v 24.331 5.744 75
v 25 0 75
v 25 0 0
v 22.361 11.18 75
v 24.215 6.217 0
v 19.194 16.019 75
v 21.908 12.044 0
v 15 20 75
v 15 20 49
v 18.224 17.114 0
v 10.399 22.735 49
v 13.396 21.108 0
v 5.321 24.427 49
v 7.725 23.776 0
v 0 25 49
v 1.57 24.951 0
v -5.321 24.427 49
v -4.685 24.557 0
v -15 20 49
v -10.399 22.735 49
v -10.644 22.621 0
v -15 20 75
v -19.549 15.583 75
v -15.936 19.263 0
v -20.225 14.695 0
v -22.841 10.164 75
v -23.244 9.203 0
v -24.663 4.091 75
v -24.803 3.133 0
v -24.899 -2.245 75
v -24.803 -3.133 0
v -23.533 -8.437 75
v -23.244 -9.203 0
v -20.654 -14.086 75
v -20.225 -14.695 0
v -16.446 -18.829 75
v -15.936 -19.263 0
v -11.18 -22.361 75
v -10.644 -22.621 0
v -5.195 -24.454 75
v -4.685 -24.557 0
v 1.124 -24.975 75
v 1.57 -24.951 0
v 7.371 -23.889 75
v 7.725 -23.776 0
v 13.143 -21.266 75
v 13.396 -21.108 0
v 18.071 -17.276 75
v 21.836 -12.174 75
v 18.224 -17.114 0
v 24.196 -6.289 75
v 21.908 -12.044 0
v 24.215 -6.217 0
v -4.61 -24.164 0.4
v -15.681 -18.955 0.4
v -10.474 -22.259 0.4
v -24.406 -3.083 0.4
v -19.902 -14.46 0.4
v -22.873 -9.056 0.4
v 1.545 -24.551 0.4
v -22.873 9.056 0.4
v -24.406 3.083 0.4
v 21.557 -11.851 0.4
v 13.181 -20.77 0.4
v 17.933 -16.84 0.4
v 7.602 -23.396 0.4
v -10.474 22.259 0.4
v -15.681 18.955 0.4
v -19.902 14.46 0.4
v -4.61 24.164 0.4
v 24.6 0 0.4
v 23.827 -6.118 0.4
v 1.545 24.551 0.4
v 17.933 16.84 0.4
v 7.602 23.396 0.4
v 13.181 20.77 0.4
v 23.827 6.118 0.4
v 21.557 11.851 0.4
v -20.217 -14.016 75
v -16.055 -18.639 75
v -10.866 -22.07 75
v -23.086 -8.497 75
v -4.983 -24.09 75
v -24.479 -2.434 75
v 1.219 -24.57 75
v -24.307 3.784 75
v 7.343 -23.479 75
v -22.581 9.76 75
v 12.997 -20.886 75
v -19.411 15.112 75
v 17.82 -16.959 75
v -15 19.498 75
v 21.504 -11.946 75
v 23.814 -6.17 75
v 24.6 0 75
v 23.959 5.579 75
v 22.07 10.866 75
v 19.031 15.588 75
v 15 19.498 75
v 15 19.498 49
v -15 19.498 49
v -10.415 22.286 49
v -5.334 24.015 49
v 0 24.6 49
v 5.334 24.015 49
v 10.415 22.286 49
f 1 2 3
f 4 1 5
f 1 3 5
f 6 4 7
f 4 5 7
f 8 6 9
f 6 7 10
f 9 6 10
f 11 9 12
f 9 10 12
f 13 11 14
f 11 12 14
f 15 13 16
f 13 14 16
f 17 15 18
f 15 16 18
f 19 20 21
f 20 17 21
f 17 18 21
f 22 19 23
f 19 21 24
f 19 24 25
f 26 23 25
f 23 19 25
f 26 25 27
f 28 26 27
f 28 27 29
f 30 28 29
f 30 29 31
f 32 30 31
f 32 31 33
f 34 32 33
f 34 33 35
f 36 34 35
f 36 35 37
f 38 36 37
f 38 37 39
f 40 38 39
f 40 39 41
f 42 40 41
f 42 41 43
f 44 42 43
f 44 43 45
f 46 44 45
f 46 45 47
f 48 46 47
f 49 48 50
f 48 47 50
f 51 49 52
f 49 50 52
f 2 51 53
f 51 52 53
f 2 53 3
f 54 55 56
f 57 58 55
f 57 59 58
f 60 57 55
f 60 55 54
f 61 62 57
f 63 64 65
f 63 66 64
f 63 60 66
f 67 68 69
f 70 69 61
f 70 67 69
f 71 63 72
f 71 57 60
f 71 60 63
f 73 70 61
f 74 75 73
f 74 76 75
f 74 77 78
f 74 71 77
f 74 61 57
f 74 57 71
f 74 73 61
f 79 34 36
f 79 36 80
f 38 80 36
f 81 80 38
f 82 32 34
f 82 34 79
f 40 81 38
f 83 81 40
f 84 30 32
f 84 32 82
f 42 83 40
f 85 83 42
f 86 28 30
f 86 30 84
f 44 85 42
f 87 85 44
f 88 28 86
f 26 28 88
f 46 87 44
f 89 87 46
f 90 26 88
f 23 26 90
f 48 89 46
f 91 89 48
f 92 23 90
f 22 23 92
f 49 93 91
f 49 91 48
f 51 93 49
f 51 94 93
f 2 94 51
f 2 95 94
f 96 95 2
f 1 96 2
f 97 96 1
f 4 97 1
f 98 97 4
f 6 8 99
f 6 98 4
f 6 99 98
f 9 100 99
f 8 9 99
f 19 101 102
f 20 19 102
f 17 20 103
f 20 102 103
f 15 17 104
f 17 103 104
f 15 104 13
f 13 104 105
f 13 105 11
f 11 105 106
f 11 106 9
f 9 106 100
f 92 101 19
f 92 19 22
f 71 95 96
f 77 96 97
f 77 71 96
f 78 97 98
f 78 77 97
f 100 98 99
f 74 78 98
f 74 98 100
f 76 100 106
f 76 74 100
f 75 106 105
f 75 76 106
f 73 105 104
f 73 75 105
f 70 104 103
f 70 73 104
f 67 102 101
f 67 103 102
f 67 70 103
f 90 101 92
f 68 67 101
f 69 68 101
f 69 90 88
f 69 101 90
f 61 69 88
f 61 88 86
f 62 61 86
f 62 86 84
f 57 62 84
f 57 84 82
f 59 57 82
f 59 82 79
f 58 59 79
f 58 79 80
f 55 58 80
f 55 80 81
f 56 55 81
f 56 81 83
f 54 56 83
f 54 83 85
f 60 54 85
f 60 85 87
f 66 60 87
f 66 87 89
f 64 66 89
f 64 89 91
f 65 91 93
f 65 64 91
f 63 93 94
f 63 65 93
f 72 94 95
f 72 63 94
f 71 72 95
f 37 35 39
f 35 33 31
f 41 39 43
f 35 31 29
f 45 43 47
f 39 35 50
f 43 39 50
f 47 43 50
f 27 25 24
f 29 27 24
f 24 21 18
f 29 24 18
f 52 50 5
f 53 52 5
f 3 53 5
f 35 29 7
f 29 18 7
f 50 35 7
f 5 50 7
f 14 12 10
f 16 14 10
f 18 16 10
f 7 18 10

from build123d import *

# Parameters (mm, degrees)
F0_R     = 25
F1_DEPTH = 75
F2_T     = -0.4
F3_W     = 30
F3_H     = 26
F4_DEPTH = 25.001


with BuildPart() as f1:
    # F0 (on Top) → F1 (new body)
    with BuildSketch(Plane.XY):
        Circle(F0_R)
    extrude(amount=F1_DEPTH)

    # F2
    f2_openings = [f1.faces().sort_by_distance(p)[0] for p in [
        (0, 0, 75),
    ]]
    offset(amount=F2_T, openings=f2_openings)

    # F3 (on Front) → F4 (cut, through all)
    with BuildSketch(Plane.XZ):
        with Locations((0, 62)):
            Rectangle(F3_W, F3_H)
    extrude(amount=-F4_DEPTH, mode=Mode.SUBTRACT)


solid = f1.part
